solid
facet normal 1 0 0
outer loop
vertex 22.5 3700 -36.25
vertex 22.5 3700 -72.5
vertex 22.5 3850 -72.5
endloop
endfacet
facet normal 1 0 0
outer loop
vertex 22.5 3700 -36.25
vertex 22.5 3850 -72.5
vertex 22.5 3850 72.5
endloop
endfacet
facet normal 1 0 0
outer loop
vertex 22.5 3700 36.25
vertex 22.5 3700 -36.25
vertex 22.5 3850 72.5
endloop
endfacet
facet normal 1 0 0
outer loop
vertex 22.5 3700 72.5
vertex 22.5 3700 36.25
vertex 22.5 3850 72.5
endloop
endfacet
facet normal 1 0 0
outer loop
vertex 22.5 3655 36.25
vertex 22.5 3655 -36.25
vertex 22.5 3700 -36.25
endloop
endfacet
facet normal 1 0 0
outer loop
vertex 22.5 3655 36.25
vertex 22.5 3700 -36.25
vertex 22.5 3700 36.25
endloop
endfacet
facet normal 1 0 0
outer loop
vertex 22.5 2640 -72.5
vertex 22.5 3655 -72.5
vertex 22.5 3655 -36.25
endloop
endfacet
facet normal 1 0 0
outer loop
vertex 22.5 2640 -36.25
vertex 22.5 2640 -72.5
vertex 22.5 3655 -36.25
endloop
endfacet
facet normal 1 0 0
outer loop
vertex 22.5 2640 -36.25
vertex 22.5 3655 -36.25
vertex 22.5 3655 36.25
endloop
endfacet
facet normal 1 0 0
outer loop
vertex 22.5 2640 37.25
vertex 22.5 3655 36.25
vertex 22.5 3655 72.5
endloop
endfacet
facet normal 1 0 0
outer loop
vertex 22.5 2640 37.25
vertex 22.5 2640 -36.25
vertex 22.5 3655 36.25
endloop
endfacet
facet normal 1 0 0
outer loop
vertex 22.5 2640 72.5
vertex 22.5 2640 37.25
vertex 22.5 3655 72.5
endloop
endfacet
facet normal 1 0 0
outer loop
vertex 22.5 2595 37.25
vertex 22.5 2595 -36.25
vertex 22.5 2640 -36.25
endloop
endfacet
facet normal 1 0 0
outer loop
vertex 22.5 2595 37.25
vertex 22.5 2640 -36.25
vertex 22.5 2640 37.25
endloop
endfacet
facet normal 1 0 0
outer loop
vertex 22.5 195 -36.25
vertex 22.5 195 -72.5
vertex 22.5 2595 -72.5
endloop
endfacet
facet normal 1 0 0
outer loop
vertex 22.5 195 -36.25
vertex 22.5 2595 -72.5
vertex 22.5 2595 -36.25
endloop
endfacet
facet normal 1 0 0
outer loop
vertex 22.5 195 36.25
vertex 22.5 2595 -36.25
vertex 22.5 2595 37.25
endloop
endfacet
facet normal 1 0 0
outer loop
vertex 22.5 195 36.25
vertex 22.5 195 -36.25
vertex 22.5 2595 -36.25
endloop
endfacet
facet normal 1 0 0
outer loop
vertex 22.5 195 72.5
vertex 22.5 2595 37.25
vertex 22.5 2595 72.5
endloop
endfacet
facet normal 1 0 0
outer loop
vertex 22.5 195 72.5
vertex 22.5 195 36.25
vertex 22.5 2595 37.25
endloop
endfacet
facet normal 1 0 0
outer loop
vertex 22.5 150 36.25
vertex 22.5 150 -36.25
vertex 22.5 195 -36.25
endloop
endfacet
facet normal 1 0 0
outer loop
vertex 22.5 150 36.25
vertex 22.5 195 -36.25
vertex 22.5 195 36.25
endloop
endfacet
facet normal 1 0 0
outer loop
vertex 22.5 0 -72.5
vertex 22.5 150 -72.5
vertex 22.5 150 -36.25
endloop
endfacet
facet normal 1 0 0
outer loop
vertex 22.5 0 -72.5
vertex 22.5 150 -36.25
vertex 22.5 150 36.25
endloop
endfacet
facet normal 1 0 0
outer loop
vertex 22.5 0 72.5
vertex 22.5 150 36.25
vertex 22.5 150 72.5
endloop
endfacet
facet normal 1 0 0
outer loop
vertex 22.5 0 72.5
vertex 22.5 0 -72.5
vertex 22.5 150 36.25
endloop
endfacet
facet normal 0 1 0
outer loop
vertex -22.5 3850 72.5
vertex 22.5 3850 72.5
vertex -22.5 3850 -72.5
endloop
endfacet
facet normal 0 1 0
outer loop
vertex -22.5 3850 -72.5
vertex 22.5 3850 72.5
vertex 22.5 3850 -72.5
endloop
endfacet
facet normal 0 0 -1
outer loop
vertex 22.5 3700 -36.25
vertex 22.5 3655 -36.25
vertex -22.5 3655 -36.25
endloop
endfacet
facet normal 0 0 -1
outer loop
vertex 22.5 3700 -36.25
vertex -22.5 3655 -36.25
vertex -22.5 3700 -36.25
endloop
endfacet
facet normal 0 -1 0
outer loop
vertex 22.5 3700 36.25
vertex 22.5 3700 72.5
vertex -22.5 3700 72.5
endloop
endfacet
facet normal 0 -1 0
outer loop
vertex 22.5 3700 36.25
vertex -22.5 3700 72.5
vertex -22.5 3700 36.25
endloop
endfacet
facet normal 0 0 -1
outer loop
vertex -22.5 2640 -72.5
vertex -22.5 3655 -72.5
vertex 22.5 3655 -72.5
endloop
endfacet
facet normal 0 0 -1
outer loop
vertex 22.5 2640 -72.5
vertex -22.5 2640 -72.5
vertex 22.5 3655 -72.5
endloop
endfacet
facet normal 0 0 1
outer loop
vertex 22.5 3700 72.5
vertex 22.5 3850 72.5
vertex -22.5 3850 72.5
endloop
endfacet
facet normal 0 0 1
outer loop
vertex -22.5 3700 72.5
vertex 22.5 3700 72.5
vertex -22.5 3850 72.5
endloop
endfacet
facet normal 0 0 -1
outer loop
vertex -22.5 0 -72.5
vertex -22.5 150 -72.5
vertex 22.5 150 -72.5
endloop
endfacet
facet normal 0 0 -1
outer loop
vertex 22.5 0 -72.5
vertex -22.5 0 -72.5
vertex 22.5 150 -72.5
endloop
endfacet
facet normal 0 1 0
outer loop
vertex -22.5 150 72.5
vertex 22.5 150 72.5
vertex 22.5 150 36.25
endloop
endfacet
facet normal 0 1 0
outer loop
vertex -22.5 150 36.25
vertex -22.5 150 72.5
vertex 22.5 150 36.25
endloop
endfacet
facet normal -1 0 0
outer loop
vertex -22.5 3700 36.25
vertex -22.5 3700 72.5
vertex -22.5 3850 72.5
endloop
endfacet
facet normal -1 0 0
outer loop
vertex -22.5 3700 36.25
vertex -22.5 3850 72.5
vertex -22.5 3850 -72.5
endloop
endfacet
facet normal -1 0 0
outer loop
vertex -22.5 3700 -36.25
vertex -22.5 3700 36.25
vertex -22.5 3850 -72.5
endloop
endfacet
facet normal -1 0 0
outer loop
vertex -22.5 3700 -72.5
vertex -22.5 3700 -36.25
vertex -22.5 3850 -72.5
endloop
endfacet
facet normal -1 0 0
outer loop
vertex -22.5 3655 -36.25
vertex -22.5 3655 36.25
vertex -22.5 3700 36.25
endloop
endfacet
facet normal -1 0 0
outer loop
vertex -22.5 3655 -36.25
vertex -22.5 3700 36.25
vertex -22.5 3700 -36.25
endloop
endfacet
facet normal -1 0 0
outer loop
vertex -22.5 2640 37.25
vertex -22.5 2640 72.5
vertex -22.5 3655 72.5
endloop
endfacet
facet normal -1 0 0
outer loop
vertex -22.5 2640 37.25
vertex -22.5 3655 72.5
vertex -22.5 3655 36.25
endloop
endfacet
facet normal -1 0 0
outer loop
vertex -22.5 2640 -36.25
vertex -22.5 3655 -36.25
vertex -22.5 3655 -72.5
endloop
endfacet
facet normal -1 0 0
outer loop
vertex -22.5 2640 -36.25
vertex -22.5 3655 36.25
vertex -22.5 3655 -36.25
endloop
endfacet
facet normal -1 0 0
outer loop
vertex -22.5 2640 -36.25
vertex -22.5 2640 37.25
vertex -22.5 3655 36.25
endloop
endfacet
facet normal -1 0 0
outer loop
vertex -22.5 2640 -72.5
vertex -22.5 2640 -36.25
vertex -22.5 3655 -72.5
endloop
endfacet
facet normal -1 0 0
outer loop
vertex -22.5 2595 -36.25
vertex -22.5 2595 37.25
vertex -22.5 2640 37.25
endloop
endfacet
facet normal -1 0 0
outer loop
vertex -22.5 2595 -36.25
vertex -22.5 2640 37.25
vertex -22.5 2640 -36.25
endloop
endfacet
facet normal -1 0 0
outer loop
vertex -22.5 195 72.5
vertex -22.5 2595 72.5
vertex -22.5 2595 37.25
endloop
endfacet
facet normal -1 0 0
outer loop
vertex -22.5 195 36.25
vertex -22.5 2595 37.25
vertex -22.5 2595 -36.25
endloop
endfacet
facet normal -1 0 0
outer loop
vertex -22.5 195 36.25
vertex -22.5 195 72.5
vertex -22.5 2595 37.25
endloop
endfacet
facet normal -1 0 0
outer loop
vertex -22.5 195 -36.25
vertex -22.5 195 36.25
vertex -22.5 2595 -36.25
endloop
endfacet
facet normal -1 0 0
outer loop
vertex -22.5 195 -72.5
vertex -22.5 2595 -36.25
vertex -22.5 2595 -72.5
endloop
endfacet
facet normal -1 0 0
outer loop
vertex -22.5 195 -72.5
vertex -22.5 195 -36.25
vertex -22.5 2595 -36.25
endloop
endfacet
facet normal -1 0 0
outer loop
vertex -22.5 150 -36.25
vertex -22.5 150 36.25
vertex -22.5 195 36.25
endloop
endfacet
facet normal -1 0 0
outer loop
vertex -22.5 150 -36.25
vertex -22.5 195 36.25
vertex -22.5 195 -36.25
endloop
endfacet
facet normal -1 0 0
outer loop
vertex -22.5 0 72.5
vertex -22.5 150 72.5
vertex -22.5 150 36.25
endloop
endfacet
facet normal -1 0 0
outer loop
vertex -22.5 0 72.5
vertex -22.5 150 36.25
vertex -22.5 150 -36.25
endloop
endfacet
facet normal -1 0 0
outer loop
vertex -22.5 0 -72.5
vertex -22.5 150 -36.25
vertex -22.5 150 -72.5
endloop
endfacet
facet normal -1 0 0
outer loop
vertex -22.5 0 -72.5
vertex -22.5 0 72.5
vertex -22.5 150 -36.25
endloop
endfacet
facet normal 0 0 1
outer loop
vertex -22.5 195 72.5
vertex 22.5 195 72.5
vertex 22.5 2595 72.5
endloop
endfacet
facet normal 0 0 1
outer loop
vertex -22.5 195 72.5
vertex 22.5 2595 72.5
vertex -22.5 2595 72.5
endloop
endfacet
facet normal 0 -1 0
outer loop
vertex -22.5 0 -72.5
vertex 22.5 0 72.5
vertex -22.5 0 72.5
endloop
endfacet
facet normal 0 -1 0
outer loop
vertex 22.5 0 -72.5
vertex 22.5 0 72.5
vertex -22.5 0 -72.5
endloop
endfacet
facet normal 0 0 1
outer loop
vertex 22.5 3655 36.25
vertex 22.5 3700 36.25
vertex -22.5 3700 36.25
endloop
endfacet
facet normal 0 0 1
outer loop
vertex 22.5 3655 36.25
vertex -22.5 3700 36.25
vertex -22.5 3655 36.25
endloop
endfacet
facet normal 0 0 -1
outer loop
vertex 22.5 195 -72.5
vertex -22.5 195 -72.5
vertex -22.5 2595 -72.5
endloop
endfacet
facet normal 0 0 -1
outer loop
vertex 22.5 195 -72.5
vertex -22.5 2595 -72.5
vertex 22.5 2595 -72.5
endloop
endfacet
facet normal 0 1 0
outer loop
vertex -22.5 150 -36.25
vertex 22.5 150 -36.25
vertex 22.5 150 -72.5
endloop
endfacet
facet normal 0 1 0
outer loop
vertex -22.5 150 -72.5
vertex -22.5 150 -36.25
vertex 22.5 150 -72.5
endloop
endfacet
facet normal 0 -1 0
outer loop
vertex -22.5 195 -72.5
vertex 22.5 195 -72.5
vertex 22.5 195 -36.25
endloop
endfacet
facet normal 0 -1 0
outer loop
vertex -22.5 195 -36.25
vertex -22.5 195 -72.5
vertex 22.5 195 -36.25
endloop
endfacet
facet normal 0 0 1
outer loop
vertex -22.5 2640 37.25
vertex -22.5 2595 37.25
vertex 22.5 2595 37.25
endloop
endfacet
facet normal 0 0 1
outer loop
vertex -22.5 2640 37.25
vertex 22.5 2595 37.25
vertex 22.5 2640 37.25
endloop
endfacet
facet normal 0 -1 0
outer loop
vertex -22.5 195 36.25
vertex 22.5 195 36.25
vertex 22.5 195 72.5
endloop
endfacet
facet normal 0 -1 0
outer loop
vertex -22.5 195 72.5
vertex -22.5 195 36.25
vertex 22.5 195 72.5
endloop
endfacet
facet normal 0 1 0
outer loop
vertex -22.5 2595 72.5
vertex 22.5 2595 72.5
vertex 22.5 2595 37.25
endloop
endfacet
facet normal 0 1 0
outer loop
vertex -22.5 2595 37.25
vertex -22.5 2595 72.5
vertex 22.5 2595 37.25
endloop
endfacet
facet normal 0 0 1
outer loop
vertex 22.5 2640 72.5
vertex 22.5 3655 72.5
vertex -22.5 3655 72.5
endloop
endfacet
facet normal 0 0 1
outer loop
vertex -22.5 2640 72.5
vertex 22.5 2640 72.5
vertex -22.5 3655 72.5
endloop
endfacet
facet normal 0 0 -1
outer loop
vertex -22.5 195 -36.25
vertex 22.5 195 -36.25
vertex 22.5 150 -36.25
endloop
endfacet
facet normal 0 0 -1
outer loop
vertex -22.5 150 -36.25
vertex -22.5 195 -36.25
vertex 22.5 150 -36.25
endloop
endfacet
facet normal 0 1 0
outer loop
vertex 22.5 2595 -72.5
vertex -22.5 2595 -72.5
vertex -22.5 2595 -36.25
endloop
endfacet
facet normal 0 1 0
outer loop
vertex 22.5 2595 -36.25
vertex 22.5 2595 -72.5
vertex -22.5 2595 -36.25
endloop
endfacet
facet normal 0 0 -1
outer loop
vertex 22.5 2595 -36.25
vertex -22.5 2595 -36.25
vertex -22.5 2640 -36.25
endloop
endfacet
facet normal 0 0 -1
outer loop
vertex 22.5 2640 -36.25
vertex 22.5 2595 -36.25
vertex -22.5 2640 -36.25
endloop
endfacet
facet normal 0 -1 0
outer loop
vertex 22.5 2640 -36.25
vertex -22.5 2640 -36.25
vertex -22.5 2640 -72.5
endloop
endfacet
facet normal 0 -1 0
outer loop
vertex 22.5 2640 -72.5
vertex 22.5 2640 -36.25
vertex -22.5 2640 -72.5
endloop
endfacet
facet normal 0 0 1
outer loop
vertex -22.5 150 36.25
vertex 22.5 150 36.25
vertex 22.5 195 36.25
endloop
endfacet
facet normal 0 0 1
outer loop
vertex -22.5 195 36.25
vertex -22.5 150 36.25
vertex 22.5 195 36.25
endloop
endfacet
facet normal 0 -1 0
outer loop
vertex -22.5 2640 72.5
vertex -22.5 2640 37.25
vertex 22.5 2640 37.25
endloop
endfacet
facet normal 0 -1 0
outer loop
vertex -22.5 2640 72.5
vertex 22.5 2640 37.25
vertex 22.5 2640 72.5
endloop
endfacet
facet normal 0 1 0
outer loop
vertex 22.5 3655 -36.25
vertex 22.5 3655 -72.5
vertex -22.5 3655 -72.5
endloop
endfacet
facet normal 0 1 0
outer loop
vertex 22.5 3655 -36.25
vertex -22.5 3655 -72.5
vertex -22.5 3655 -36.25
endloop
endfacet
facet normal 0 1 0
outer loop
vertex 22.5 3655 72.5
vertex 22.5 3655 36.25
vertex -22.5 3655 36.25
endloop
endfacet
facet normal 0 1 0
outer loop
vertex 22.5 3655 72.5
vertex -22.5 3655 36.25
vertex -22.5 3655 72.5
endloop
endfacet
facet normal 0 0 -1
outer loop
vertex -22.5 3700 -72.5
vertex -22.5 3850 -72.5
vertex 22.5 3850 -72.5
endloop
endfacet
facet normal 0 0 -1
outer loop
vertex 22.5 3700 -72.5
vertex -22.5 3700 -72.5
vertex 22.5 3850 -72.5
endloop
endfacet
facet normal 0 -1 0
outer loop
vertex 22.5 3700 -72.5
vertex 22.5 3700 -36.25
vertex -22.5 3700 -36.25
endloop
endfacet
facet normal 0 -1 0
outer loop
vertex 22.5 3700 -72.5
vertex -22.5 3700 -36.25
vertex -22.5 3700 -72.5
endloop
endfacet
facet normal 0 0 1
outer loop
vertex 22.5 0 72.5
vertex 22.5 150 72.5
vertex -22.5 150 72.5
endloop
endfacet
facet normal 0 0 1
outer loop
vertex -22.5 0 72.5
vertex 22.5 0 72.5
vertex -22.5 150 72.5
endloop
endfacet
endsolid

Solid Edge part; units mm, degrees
sketch "Sketch1" plane through (0, 0, 0) normal (0, -1, 0) x (1, 0, 0)
  line L0 (-22.5, -72.5) -> (22.5, -72.5)
  line L1 (22.5, -72.5) -> (22.5, 72.5)
  line L2 (22.5, 72.5) -> (-22.5, 72.5)
  line L3 (-22.5, 72.5) -> (-22.5, -72.5)
extrude "Protrusion1" add sketch "Sketch1" against normal blind 3850
sketch "Sketch2" plane through (22.5, 1925, 0) normal (1, 0, 0) x (0, 1, 0)
  line L0 (1775, 72.5) -> (1775, 36.25)
  line L1 (1775, 36.25) -> (1730, 36.25)
  line L2 (1730, 36.25) -> (1730, 72.5)
  line L3 (1730, 72.5) -> (1775, 72.5)
  line L4 (-1775, 72.5) -> (-1775, 36.25)
  line L5 (-1775, 36.25) -> (-1730, 36.25)
  line L6 (-1730, 36.25) -> (-1730, 72.5)
  line L7 (-1730, 72.5) -> (-1775, 72.5)
extrude "ExtrudedCutout_1" cut sketch "Sketch2" against normal blind 86.6929
mirror "Mirror1" about plane through (0, 0, 0) normal (0, 0, -1) of "ExtrudedCutout_1"
sketch "Sketch3" plane through (-22.5, 1925, 0) normal (-1, 0, 0) x (0, -1, 0)
  line L0 (-670, 72.5) -> (-715, 72.5)
  line L1 (-715, 37.25) -> (-715, 72.5)
  line L2 (-670, 37.25) -> (-715, 37.25)
  line L3 (-670, 72.5) -> (-670, 37.25)
  line L4 (-715, -72.5) -> (-670, -72.5)
  line L5 (-670, -72.5) -> (-670, -36.25)
  line L6 (-670, -36.25) -> (-715, -36.25)
  line L7 (-715, -36.25) -> (-715, -72.5)
extrude "ExtrudedCutout_2" cut sketch "Sketch3" against normal blind 78.7482
properties material "Wood, Pine"
